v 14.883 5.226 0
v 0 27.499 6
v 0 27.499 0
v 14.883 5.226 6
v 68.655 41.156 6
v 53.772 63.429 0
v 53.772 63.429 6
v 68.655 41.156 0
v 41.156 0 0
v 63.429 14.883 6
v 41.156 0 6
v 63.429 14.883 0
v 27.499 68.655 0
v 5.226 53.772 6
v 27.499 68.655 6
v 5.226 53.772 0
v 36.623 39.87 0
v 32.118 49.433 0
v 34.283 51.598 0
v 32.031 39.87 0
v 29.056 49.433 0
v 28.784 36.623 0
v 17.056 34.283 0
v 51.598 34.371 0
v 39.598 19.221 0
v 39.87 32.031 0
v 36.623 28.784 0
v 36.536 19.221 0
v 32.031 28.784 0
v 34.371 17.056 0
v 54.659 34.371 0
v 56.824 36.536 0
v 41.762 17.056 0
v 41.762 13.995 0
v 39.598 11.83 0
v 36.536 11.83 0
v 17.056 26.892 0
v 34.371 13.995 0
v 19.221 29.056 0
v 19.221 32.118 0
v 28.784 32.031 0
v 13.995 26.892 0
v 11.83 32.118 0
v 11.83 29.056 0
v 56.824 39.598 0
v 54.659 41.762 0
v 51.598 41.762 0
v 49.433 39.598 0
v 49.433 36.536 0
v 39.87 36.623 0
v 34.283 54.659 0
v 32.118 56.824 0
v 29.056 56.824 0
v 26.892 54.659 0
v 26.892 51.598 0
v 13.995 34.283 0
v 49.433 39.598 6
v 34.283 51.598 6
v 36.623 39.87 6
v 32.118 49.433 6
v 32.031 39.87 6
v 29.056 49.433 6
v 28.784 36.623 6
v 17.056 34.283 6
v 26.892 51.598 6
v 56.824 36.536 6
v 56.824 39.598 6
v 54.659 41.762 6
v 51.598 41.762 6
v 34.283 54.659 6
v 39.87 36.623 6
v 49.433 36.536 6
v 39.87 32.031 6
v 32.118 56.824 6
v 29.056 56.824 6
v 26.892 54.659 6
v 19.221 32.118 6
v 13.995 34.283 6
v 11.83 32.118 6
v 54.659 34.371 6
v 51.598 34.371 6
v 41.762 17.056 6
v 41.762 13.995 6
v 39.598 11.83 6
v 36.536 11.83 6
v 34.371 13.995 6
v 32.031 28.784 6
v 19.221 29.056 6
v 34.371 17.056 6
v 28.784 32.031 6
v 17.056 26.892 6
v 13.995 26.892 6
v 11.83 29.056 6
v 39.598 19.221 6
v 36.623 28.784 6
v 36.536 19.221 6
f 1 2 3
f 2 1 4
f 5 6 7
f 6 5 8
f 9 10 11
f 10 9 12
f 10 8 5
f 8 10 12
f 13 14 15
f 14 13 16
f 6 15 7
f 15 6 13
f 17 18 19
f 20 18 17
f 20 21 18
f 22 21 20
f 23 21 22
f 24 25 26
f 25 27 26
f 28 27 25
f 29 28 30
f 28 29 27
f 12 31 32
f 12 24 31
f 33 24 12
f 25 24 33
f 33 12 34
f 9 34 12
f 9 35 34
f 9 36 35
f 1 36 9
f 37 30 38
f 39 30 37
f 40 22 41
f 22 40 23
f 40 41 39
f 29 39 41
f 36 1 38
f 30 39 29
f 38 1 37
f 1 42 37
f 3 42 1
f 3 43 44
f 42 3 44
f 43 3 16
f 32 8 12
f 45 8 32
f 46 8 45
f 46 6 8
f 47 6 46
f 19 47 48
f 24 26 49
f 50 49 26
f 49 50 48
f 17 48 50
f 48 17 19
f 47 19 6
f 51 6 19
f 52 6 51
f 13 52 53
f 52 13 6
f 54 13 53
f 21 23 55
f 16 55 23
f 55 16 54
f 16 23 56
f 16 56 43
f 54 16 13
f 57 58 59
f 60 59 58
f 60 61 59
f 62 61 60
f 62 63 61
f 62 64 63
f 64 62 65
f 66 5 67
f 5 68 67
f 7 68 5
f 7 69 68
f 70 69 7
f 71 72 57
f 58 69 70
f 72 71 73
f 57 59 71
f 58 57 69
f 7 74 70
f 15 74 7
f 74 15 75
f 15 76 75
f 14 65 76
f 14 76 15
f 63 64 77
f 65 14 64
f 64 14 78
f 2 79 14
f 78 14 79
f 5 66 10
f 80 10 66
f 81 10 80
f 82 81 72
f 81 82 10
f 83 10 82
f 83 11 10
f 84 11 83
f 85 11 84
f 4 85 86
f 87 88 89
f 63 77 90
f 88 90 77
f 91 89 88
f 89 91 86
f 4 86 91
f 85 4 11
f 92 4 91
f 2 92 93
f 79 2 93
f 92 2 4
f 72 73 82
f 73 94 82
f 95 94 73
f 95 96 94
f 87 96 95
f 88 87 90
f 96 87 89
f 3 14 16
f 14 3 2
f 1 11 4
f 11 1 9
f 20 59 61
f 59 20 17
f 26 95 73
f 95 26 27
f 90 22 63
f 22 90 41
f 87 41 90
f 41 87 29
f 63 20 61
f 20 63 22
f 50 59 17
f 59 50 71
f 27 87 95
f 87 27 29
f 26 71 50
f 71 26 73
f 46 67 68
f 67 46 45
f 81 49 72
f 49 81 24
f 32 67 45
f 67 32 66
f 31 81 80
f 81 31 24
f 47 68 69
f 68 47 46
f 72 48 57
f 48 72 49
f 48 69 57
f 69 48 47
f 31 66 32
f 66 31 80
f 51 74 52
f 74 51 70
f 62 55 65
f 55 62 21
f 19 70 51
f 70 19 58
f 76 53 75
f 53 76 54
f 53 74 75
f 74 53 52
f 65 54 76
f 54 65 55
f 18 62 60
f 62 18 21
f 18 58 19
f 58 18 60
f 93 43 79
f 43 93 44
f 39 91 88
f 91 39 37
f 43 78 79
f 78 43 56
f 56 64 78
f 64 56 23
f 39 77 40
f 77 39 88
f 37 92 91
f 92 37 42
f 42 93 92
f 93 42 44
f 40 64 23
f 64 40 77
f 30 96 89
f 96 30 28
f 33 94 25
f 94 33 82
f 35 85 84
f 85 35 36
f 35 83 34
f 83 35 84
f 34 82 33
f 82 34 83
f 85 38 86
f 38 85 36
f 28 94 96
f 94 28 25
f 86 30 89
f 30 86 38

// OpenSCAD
$fn = 32;

// ----------------------------------------------------------------------
// Polygon plate: 8-gon R35, 4 bolt windows
// ----------------------------------------------------------------------

// --- parameters (mm) ---
sides = 8;                // number of polygon sides
plate_r = 35;             // circumscribed radius of the polygon
bore_r = 6;               // centre bore radius
bolts = 4;                // number of bolt windows
ring_r = 19.17;           // bolt-circle radius
bolt_r = 4;               // bolt window radius
plate_t = 6;              // plate thickness, Z (extrusion height)

plate_d = 2 * plate_r;  // circumscribed diameter
bore_d = 2 * bore_r;  // centre bore diameter
bolt_d = 2 * bolt_r;  // bolt window diameter
ring_d = 2 * ring_r;  // bolt-circle diameter

profile = [[68.655, 41.156], [53.772, 63.429], [27.499, 68.655], [5.226, 53.772], [0, 27.499], [14.883, 5.226], [41.156, 0], [63.429, 14.883]];  // primary outline, 8 points, counter clockwise
void_1 = [[39.87, 36.623], [36.623, 39.87], [32.031, 39.87], [28.784, 36.623], [28.784, 32.031], [32.031, 28.784], [36.623, 28.784], [39.87, 32.031]];  // centre bore, 8 points
void_2 = [[56.824, 39.598], [54.659, 41.762], [51.598, 41.762], [49.433, 39.598], [49.433, 36.536], [51.598, 34.371], [54.659, 34.371], [56.824, 36.536]];  // bolt window 1, 8 points
void_3 = [[34.283, 54.659], [32.118, 56.824], [29.056, 56.824], [26.892, 54.659], [26.892, 51.598], [29.056, 49.433], [32.118, 49.433], [34.283, 51.598]];  // bolt window 2, 8 points
void_4 = [[19.221, 32.118], [17.056, 34.283], [13.995, 34.283], [11.83, 32.118], [11.83, 29.056], [13.995, 26.892], [17.056, 26.892], [19.221, 29.056]];  // bolt window 3, 8 points
void_5 = [[41.762, 17.056], [39.598, 19.221], [36.536, 19.221], [34.371, 17.056], [34.371, 13.995], [36.536, 11.83], [39.598, 11.83], [41.762, 13.995]];  // bolt window 4, 8 points

// --- the one profile operation ---
difference() {
  linear_extrude(height = plate_t) polygon(points = profile);
  translate([0, 0, -1])
    linear_extrude(height = plate_t + 2) polygon(points = void_1);
  translate([0, 0, -1])
    linear_extrude(height = plate_t + 2) polygon(points = void_2);
  translate([0, 0, -1])
    linear_extrude(height = plate_t + 2) polygon(points = void_3);
  translate([0, 0, -1])
    linear_extrude(height = plate_t + 2) polygon(points = void_4);
  translate([0, 0, -1])
    linear_extrude(height = plate_t + 2) polygon(points = void_5);
}
